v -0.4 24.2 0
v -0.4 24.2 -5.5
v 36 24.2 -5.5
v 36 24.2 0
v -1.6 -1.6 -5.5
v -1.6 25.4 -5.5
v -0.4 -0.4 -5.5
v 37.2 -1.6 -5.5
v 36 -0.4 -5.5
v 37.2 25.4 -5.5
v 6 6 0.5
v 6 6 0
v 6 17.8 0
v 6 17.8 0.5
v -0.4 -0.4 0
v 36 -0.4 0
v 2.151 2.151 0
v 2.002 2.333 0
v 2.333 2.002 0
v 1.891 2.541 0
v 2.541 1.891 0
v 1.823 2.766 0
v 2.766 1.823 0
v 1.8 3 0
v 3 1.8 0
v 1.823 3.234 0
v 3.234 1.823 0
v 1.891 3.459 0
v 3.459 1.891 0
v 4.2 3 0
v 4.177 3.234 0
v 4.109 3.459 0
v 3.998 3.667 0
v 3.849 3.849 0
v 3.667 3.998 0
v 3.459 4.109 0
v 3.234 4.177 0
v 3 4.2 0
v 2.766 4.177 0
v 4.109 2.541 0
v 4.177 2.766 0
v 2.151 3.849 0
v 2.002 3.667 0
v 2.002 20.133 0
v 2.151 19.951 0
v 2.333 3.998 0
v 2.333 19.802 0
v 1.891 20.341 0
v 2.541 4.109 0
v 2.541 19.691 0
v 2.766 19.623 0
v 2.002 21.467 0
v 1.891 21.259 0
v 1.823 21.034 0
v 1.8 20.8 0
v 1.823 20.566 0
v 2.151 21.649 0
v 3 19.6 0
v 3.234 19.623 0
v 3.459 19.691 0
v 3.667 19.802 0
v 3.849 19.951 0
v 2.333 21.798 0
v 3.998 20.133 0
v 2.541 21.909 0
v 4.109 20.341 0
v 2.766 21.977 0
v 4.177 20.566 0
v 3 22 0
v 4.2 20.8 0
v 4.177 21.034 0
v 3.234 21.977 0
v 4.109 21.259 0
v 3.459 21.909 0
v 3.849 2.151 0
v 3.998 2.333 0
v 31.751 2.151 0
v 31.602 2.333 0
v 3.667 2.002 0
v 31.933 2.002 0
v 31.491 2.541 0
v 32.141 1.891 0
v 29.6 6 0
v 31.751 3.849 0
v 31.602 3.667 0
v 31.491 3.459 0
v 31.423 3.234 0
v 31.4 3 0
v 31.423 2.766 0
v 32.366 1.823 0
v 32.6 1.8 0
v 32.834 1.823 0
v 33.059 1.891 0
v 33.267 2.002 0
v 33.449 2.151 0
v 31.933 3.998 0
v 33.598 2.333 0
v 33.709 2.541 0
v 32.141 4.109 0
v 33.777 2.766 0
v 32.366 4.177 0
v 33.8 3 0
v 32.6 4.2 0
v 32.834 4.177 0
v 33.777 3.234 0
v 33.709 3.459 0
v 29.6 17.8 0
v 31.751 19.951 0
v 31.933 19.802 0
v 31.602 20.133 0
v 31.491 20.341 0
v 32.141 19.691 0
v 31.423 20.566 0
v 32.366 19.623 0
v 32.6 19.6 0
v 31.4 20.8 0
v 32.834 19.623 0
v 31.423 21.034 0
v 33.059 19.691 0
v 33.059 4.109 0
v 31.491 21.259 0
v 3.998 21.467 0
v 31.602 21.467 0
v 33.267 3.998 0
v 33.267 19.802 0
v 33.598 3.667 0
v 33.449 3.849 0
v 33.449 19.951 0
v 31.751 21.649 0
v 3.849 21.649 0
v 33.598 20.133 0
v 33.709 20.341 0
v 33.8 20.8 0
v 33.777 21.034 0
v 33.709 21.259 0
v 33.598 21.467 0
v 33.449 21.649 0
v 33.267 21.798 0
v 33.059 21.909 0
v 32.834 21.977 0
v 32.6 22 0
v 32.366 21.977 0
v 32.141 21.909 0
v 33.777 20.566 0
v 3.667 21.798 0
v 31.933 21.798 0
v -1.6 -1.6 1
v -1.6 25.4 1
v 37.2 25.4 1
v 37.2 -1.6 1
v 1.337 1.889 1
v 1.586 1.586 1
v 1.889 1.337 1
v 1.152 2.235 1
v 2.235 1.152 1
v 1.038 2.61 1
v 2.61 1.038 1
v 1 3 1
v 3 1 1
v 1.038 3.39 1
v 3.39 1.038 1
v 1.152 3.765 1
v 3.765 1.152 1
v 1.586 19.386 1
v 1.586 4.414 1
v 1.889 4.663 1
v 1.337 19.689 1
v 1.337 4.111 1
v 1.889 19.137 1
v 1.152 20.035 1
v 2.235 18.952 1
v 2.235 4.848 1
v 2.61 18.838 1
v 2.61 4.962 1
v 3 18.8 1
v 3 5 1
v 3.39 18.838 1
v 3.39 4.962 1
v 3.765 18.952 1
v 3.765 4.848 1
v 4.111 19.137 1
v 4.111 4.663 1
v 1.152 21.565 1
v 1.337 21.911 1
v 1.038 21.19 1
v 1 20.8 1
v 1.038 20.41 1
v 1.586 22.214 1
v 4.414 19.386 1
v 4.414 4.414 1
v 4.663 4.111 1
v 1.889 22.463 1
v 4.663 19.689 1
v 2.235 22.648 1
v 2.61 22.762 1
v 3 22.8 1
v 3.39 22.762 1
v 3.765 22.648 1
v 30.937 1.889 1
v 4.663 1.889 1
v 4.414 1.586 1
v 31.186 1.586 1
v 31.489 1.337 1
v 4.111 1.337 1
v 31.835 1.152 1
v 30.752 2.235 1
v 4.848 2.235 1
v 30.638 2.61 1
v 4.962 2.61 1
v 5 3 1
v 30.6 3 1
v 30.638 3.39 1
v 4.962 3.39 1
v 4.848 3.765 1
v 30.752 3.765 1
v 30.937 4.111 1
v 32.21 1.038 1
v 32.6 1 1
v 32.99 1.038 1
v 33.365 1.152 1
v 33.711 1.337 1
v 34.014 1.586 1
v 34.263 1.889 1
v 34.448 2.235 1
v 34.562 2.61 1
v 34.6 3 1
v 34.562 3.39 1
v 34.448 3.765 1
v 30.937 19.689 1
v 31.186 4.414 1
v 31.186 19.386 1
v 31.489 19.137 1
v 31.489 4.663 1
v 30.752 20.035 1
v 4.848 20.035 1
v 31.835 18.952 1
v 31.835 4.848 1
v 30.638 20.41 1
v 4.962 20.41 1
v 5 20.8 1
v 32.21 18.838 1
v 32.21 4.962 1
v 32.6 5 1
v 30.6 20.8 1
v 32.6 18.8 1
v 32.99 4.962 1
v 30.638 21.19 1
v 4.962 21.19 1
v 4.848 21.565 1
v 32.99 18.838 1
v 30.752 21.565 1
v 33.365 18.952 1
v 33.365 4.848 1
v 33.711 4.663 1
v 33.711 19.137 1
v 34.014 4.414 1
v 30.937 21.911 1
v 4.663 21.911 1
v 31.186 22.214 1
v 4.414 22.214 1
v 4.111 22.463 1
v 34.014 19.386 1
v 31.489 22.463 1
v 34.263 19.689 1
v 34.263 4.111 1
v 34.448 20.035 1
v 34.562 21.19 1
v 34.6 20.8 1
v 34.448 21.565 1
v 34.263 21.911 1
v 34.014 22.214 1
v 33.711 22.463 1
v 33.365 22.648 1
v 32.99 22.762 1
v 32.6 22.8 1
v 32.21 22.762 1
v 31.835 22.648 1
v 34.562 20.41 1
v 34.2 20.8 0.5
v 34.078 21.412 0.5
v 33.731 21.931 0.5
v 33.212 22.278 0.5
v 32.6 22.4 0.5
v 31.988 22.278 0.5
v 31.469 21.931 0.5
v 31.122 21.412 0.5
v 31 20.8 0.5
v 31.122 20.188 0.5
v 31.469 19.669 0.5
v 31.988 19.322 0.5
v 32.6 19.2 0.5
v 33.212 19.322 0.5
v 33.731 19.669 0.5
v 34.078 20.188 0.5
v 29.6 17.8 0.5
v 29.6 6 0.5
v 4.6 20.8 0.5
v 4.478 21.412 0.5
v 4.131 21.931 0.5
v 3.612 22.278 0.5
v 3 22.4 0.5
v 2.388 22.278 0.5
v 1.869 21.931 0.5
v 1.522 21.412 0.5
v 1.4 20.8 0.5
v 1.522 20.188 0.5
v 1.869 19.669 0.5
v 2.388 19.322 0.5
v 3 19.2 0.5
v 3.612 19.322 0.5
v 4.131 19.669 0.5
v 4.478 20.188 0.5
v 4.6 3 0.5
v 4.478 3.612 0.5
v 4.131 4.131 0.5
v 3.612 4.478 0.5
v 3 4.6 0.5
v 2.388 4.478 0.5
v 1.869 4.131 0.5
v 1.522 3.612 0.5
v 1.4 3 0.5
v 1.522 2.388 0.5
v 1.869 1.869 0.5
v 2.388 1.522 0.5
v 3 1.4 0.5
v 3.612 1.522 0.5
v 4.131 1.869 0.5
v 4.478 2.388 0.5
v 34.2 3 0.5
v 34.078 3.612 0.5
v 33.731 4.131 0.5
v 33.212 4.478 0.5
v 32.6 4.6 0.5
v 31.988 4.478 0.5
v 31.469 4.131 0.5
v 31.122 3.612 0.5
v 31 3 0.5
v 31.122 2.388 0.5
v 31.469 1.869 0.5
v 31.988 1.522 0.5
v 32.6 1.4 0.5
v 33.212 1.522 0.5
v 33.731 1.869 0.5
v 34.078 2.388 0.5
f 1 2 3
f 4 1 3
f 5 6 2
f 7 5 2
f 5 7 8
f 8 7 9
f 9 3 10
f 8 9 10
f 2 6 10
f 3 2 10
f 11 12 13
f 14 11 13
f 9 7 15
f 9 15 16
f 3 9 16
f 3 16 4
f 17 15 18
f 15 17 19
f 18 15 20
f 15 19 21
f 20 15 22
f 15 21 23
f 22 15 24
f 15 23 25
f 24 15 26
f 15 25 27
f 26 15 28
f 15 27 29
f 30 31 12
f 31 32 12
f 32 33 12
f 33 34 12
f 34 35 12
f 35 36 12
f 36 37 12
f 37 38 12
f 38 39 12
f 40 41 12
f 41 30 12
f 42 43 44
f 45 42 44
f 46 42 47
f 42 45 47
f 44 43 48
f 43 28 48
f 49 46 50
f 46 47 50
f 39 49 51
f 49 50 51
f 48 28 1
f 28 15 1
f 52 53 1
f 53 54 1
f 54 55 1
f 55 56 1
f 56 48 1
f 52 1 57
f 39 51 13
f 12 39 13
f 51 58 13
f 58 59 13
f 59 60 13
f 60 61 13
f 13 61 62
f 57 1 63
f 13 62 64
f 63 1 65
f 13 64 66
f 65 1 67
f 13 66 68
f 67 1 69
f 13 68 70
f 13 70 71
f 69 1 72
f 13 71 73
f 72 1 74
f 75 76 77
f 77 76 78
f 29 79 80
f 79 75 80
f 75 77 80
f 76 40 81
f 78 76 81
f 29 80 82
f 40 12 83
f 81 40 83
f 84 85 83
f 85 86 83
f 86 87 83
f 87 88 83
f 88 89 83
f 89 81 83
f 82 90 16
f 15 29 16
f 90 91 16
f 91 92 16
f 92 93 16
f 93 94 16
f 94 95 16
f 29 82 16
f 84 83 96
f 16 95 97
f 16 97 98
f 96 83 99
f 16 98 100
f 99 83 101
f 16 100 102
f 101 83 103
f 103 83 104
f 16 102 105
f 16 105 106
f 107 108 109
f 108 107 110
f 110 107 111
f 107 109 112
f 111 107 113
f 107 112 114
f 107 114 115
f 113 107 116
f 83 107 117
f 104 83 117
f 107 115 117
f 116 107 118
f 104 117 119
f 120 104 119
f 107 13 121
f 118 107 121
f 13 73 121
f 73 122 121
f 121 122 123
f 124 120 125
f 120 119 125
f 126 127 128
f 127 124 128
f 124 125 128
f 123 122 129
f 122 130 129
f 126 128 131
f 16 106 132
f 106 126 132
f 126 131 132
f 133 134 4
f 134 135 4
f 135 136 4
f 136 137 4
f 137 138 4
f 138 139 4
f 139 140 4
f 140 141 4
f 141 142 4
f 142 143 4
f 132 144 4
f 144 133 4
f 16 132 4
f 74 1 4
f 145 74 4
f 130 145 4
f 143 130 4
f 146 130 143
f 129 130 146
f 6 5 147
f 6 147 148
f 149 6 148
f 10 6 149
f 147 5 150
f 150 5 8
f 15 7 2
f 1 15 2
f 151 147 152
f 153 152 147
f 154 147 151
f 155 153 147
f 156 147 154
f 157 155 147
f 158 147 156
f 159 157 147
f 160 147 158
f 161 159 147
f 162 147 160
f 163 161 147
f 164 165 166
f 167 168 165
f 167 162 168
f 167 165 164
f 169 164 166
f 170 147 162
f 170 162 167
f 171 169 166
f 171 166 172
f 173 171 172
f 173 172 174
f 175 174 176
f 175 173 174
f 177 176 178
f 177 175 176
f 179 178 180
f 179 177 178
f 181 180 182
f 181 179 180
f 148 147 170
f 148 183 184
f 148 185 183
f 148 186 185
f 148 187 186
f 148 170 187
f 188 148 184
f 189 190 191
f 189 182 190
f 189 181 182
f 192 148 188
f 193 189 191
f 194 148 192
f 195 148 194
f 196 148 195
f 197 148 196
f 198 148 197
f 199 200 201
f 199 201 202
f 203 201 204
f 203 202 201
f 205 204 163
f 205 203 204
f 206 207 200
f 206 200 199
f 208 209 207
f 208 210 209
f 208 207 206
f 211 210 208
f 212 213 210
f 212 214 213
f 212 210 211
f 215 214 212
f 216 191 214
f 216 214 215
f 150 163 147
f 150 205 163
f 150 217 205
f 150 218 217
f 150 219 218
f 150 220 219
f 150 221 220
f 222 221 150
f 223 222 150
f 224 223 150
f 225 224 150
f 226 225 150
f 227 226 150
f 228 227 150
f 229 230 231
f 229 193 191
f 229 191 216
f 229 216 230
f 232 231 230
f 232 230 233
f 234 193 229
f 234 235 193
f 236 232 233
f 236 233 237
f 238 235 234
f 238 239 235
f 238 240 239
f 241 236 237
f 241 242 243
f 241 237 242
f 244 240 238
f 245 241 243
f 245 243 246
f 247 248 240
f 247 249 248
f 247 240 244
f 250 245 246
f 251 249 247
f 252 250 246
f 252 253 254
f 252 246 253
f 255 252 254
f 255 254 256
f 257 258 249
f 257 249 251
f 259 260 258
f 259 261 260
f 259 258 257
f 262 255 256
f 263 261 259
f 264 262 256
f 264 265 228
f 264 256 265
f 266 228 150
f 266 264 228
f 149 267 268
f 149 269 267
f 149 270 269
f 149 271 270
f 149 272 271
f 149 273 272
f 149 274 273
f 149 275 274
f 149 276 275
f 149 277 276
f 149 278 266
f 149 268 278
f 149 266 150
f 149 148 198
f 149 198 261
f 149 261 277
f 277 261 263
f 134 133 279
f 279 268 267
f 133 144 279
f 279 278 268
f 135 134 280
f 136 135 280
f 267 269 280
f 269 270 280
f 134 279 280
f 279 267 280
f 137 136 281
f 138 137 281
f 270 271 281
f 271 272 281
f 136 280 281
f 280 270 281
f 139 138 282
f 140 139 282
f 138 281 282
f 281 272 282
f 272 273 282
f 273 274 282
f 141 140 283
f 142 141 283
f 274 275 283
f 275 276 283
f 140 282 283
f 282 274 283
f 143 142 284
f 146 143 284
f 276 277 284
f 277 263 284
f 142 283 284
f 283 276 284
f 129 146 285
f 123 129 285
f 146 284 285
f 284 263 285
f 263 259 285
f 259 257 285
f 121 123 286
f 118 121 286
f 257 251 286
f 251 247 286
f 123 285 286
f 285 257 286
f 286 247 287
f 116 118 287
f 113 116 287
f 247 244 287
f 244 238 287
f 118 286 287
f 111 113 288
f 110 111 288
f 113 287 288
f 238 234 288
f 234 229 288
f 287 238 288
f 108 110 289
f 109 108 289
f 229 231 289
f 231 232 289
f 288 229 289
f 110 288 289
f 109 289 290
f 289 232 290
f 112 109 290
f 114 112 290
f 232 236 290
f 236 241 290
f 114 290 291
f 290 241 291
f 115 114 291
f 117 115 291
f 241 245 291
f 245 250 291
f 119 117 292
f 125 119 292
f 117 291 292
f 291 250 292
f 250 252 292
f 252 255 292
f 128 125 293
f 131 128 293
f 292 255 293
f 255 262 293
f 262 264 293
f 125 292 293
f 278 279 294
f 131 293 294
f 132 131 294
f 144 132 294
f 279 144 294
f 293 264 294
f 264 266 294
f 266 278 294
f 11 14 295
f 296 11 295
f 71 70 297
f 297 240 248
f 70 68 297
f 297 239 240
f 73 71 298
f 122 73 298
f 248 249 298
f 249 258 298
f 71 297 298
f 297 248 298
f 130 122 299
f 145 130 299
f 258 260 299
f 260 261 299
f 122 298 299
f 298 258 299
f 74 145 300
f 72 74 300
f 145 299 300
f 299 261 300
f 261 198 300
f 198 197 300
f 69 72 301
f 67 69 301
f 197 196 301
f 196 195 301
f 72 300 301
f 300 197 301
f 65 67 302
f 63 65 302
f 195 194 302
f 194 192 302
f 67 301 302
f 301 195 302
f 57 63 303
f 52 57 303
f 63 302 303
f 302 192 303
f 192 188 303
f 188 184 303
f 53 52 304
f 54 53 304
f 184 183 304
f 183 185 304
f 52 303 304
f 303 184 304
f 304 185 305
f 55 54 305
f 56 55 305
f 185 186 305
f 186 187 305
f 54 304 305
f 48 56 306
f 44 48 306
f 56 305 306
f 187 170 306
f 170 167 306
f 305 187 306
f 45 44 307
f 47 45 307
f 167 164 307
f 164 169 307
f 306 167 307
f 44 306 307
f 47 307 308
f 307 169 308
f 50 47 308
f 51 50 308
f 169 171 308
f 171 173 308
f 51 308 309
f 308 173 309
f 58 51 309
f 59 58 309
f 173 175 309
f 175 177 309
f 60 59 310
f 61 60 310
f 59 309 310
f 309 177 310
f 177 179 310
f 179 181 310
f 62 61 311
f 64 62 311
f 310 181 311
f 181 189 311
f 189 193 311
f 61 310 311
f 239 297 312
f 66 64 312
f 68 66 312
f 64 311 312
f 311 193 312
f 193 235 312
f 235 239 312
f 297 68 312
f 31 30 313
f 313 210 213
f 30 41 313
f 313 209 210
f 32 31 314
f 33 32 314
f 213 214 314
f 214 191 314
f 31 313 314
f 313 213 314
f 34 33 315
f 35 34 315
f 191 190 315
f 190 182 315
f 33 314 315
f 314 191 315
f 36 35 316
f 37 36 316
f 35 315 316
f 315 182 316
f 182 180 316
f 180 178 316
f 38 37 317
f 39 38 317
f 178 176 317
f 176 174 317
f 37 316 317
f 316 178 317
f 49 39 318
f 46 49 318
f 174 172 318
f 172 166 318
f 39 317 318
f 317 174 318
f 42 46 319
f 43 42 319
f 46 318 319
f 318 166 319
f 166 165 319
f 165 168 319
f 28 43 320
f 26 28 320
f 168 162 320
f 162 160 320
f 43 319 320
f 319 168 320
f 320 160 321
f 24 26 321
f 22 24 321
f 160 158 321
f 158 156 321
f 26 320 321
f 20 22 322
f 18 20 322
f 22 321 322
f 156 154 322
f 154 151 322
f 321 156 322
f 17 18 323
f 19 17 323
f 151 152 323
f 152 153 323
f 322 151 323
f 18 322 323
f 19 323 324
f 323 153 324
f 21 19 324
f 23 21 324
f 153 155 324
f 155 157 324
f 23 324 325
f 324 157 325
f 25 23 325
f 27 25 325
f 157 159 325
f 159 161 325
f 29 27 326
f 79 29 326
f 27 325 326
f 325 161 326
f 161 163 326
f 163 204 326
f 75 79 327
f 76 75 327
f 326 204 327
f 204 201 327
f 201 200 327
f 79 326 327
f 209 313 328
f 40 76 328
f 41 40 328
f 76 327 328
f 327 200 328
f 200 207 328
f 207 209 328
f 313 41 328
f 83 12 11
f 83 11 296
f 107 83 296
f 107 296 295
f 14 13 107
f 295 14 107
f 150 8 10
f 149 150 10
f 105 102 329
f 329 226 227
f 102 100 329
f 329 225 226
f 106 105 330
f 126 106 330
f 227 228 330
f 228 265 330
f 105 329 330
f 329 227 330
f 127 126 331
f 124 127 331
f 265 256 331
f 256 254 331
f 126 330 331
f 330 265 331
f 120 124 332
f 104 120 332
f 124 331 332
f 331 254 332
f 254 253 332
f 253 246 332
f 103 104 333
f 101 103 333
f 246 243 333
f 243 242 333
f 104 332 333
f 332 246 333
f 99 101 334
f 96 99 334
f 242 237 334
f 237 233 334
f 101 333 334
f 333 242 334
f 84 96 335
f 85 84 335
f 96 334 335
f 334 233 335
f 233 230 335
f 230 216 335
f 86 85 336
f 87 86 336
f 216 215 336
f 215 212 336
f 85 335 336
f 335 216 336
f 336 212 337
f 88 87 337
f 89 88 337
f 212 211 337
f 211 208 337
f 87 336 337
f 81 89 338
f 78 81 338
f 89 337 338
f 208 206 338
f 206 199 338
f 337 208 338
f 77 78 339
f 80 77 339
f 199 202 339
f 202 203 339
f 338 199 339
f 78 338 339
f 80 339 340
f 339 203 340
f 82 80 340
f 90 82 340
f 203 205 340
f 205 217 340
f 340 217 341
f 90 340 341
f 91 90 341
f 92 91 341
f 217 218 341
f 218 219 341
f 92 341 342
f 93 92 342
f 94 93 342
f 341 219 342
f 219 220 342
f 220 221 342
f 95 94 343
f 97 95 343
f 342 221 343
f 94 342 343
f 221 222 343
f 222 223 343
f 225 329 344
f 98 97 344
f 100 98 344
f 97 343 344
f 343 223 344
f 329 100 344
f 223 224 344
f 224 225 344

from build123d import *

# Parameters (mm, degrees)
BOX009_W          = 36.4
BOX009_H          = 24.6
BOX009_DEPTH      = 6.5
BOX008_W          = 38.8
BOX008_H          = 27
BOX008_DEPTH      = 6.5
CYLINDER008_R     = 1.2
CYLINDER008_DEPTH = 10
ARRAY012_X_COUNT  = 2
ARRAY012_X_PITCH  = 29.6
ARRAY012_Y_COUNT  = 2
ARRAY012_Y_PITCH  = 17.8
BOX011_W          = 4.6
BOX011_H          = 1
BOX011_DEPTH      = 10
CYLINDER004_R     = 1.5
CYLINDER004_DEPTH = 10
CYLINDER005_R     = 2.3
CYLINDER005_DEPTH = 10
ARRAY004_X_COUNT  = 2
ARRAY004_X_PITCH  = 11.8
BOX006_W          = 36.4
BOX006_H          = 24.6
BOX006_DEPTH      = 0.5
CYLINDER_R        = 1.2
CYLINDER_DEPTH    = 10
ARRAY001_X_COUNT  = 2
ARRAY001_X_PITCH  = 29.6
ARRAY001_Y_COUNT  = 2
ARRAY001_Y_PITCH  = 17.8
BOX003_W          = 23.6
BOX003_H          = 11.8
BOX003_DEPTH      = 10
BOX007_W          = 36.4
BOX007_H          = 24.6
BOX007_DEPTH      = 0.5


with BuildPart() as outer_wall_hole_cube:
    # Box009 → Box009 (new body)
    with BuildSketch(Plane(origin=(-0.4, -0.4, 0), x_dir=(1, 0, 0), z_dir=(0, 0, 1))):
        with Locations((18.2, 12.3)):
            Rectangle(BOX009_W, BOX009_H)
    extrude(amount=BOX009_DEPTH)


with BuildPart() as outer_wall_cut:
    # Box008 → Box008 (new body)
    with BuildSketch(Plane(origin=(-1.6, -1.6, 0), x_dir=(1, 0, 0), z_dir=(0, 0, 1))):
        with Locations((19.4, 13.5)):
            Rectangle(BOX008_W, BOX008_H)
    extrude(amount=BOX008_DEPTH)

    # Cut004: cut outer wall hole cube
    add(outer_wall_hole_cube.part, mode=Mode.SUBTRACT)


with BuildPart() as outer_wall_cut_1:
    # Cut004 placement: moved
    add(outer_wall_cut.part.moved(Location((0, 0, -5.5))))


with BuildPart() as bolt_hole003:
    # Cylinder008 → Cylinder008 (new body)
    with BuildSketch(Plane.XY.offset(-10)):
        Circle(CYLINDER008_R)
    extrude(amount=CYLINDER008_DEPTH)


with BuildPart() as bolt_hole_fusion_array:
    # Cone → Cone (revolve)
    with BuildSketch(Plane.XZ):
        Polygon((0, 0), (1.2, 0), (2, 1), (0, 1), align=None)
    revolve(axis=Axis((0, 0, 0), (0, 0, 1)))

    # Fusion011: union bolt hole003
    add(bolt_hole003.part)

    # Array012 X: bolt hole fusion array ×2


with BuildPart() as bolt_hole_fusion_array_1:
    add(bolt_hole_fusion_array.part)
    with Locations(*[(i * ARRAY012_X_PITCH, 0, 0) for i in range(1, ARRAY012_X_COUNT)]):
        add(bolt_hole_fusion_array.part)

    # Array012 Y: bolt hole fusion array ×2


with BuildPart() as bolt_hole_fusion_array_2:
    add(bolt_hole_fusion_array_1.part)
    with Locations(*[(0, i * ARRAY012_Y_PITCH, 0) for i in range(1, ARRAY012_Y_COUNT)]):
        add(bolt_hole_fusion_array_1.part)


with BuildPart() as bolt_hole_fusion_array_3:
    # Array012 placement: moved
    add(bolt_hole_fusion_array_2.part.moved(Location((3, 3, 0))))


with BuildPart() as btn_cross_line:
    # Box011 → Box011 (new body)
    with BuildSketch(Plane(origin=(-2.3, -0.5, 0), x_dir=(1, 0, 0), z_dir=(0, 0, 1))):
        with Locations((2.3, 0.5)):
            Rectangle(BOX011_W, BOX011_H)
    extrude(amount=BOX011_DEPTH)


with BuildPart() as btn_line_center_fusion:
    # Cylinder004 → Cylinder004 (new body)
    with BuildSketch(Plane.XY):
        Circle(CYLINDER004_R)
    extrude(amount=CYLINDER004_DEPTH)

    # Fusion008: union btn cross line
    add(btn_cross_line.part)


with BuildPart() as top_hole_fusion:
    # Cylinder005 → Cylinder005 (new body)
    with BuildSketch(Plane.XY.offset(-9.5)):
        Circle(CYLINDER005_R)
    extrude(amount=CYLINDER005_DEPTH)

    # Cut006: cut btn line center fusion
    add(btn_line_center_fusion.part, mode=Mode.SUBTRACT)

    # Array004 X: top hole fusion ×2


with BuildPart() as top_hole_fusion_1:
    add(top_hole_fusion.part)
    with Locations(*[(i * ARRAY004_X_PITCH, 0, 0) for i in range(1, ARRAY004_X_COUNT)]):
        add(top_hole_fusion.part)


with BuildPart() as top_hole_fusion_2:
    # Array004 placement: moved
    add(top_hole_fusion_1.part.moved(Location((11.9, 11.9, 0))))

    # Fusion004: union bolt hole fusion array
    add(bolt_hole_fusion_array_3.part)


with BuildPart() as thin_top_plate:
    # Box006 → Box006 (new body)
    with BuildSketch(Plane(origin=(-0.4, -0.4, 0.5), x_dir=(1, 0, 0), z_dir=(0, 0, 1))):
        with Locations((18.2, 12.3)):
            Rectangle(BOX006_W, BOX006_H)
    extrude(amount=BOX006_DEPTH)


with BuildPart() as bolt_hole_array_clone:
    # Cylinder → Cylinder (new body)
    with BuildSketch(Plane.XY):
        Circle(CYLINDER_R)
    extrude(amount=CYLINDER_DEPTH)

    # Array001 X: bolt hole array clone ×2


with BuildPart() as bolt_hole_array_clone_1:
    add(bolt_hole_array_clone.part)
    with Locations(*[(i * ARRAY001_X_PITCH, 0, 0) for i in range(1, ARRAY001_X_COUNT)]):
        add(bolt_hole_array_clone.part)

    # Array001 Y: bolt hole array clone ×2


with BuildPart() as bolt_hole_array_clone_2:
    add(bolt_hole_array_clone_1.part)
    with Locations(*[(0, i * ARRAY001_Y_PITCH, 0) for i in range(1, ARRAY001_Y_COUNT)]):
        add(bolt_hole_array_clone_1.part)


with BuildPart() as bolt_hole_array_clone_3:
    # Array001 placement: moved
    add(bolt_hole_array_clone_2.part.moved(Location((3, 3, 0))))


with BuildPart() as mesh_extraction_fusion_clone:
    # Box003 → Box003 (new body)
    with BuildSketch(Plane(origin=(6, 6, 0), x_dir=(1, 0, 0), z_dir=(0, 0, 1))):
        with Locations((11.8, 5.9)):
            Rectangle(BOX003_W, BOX003_H)
    extrude(amount=BOX003_DEPTH)

    # Fusion003: union bolt hole array clone
    add(bolt_hole_array_clone_3.part)


with BuildPart() as top_cover_plate_fusion:
    # Box007 → Box007 (new body)
    with BuildSketch(Plane(origin=(-0.4, -0.4, 0), x_dir=(1, 0, 0), z_dir=(0, 0, 1))):
        with Locations((18.2, 12.3)):
            Rectangle(BOX007_W, BOX007_H)
    extrude(amount=BOX007_DEPTH)

    # Cut003: cut mesh extraction fusion clone
    add(mesh_extraction_fusion_clone.part, mode=Mode.SUBTRACT)

    # Fusion012: union thin top plate
    add(thin_top_plate.part)

    # Cut002: cut top hole fusion
    add(top_hole_fusion_2.part, mode=Mode.SUBTRACT)

    # Fusion005: union outer wall cut
    add(outer_wall_cut_1.part)


solid = top_cover_plate_fusion.part
